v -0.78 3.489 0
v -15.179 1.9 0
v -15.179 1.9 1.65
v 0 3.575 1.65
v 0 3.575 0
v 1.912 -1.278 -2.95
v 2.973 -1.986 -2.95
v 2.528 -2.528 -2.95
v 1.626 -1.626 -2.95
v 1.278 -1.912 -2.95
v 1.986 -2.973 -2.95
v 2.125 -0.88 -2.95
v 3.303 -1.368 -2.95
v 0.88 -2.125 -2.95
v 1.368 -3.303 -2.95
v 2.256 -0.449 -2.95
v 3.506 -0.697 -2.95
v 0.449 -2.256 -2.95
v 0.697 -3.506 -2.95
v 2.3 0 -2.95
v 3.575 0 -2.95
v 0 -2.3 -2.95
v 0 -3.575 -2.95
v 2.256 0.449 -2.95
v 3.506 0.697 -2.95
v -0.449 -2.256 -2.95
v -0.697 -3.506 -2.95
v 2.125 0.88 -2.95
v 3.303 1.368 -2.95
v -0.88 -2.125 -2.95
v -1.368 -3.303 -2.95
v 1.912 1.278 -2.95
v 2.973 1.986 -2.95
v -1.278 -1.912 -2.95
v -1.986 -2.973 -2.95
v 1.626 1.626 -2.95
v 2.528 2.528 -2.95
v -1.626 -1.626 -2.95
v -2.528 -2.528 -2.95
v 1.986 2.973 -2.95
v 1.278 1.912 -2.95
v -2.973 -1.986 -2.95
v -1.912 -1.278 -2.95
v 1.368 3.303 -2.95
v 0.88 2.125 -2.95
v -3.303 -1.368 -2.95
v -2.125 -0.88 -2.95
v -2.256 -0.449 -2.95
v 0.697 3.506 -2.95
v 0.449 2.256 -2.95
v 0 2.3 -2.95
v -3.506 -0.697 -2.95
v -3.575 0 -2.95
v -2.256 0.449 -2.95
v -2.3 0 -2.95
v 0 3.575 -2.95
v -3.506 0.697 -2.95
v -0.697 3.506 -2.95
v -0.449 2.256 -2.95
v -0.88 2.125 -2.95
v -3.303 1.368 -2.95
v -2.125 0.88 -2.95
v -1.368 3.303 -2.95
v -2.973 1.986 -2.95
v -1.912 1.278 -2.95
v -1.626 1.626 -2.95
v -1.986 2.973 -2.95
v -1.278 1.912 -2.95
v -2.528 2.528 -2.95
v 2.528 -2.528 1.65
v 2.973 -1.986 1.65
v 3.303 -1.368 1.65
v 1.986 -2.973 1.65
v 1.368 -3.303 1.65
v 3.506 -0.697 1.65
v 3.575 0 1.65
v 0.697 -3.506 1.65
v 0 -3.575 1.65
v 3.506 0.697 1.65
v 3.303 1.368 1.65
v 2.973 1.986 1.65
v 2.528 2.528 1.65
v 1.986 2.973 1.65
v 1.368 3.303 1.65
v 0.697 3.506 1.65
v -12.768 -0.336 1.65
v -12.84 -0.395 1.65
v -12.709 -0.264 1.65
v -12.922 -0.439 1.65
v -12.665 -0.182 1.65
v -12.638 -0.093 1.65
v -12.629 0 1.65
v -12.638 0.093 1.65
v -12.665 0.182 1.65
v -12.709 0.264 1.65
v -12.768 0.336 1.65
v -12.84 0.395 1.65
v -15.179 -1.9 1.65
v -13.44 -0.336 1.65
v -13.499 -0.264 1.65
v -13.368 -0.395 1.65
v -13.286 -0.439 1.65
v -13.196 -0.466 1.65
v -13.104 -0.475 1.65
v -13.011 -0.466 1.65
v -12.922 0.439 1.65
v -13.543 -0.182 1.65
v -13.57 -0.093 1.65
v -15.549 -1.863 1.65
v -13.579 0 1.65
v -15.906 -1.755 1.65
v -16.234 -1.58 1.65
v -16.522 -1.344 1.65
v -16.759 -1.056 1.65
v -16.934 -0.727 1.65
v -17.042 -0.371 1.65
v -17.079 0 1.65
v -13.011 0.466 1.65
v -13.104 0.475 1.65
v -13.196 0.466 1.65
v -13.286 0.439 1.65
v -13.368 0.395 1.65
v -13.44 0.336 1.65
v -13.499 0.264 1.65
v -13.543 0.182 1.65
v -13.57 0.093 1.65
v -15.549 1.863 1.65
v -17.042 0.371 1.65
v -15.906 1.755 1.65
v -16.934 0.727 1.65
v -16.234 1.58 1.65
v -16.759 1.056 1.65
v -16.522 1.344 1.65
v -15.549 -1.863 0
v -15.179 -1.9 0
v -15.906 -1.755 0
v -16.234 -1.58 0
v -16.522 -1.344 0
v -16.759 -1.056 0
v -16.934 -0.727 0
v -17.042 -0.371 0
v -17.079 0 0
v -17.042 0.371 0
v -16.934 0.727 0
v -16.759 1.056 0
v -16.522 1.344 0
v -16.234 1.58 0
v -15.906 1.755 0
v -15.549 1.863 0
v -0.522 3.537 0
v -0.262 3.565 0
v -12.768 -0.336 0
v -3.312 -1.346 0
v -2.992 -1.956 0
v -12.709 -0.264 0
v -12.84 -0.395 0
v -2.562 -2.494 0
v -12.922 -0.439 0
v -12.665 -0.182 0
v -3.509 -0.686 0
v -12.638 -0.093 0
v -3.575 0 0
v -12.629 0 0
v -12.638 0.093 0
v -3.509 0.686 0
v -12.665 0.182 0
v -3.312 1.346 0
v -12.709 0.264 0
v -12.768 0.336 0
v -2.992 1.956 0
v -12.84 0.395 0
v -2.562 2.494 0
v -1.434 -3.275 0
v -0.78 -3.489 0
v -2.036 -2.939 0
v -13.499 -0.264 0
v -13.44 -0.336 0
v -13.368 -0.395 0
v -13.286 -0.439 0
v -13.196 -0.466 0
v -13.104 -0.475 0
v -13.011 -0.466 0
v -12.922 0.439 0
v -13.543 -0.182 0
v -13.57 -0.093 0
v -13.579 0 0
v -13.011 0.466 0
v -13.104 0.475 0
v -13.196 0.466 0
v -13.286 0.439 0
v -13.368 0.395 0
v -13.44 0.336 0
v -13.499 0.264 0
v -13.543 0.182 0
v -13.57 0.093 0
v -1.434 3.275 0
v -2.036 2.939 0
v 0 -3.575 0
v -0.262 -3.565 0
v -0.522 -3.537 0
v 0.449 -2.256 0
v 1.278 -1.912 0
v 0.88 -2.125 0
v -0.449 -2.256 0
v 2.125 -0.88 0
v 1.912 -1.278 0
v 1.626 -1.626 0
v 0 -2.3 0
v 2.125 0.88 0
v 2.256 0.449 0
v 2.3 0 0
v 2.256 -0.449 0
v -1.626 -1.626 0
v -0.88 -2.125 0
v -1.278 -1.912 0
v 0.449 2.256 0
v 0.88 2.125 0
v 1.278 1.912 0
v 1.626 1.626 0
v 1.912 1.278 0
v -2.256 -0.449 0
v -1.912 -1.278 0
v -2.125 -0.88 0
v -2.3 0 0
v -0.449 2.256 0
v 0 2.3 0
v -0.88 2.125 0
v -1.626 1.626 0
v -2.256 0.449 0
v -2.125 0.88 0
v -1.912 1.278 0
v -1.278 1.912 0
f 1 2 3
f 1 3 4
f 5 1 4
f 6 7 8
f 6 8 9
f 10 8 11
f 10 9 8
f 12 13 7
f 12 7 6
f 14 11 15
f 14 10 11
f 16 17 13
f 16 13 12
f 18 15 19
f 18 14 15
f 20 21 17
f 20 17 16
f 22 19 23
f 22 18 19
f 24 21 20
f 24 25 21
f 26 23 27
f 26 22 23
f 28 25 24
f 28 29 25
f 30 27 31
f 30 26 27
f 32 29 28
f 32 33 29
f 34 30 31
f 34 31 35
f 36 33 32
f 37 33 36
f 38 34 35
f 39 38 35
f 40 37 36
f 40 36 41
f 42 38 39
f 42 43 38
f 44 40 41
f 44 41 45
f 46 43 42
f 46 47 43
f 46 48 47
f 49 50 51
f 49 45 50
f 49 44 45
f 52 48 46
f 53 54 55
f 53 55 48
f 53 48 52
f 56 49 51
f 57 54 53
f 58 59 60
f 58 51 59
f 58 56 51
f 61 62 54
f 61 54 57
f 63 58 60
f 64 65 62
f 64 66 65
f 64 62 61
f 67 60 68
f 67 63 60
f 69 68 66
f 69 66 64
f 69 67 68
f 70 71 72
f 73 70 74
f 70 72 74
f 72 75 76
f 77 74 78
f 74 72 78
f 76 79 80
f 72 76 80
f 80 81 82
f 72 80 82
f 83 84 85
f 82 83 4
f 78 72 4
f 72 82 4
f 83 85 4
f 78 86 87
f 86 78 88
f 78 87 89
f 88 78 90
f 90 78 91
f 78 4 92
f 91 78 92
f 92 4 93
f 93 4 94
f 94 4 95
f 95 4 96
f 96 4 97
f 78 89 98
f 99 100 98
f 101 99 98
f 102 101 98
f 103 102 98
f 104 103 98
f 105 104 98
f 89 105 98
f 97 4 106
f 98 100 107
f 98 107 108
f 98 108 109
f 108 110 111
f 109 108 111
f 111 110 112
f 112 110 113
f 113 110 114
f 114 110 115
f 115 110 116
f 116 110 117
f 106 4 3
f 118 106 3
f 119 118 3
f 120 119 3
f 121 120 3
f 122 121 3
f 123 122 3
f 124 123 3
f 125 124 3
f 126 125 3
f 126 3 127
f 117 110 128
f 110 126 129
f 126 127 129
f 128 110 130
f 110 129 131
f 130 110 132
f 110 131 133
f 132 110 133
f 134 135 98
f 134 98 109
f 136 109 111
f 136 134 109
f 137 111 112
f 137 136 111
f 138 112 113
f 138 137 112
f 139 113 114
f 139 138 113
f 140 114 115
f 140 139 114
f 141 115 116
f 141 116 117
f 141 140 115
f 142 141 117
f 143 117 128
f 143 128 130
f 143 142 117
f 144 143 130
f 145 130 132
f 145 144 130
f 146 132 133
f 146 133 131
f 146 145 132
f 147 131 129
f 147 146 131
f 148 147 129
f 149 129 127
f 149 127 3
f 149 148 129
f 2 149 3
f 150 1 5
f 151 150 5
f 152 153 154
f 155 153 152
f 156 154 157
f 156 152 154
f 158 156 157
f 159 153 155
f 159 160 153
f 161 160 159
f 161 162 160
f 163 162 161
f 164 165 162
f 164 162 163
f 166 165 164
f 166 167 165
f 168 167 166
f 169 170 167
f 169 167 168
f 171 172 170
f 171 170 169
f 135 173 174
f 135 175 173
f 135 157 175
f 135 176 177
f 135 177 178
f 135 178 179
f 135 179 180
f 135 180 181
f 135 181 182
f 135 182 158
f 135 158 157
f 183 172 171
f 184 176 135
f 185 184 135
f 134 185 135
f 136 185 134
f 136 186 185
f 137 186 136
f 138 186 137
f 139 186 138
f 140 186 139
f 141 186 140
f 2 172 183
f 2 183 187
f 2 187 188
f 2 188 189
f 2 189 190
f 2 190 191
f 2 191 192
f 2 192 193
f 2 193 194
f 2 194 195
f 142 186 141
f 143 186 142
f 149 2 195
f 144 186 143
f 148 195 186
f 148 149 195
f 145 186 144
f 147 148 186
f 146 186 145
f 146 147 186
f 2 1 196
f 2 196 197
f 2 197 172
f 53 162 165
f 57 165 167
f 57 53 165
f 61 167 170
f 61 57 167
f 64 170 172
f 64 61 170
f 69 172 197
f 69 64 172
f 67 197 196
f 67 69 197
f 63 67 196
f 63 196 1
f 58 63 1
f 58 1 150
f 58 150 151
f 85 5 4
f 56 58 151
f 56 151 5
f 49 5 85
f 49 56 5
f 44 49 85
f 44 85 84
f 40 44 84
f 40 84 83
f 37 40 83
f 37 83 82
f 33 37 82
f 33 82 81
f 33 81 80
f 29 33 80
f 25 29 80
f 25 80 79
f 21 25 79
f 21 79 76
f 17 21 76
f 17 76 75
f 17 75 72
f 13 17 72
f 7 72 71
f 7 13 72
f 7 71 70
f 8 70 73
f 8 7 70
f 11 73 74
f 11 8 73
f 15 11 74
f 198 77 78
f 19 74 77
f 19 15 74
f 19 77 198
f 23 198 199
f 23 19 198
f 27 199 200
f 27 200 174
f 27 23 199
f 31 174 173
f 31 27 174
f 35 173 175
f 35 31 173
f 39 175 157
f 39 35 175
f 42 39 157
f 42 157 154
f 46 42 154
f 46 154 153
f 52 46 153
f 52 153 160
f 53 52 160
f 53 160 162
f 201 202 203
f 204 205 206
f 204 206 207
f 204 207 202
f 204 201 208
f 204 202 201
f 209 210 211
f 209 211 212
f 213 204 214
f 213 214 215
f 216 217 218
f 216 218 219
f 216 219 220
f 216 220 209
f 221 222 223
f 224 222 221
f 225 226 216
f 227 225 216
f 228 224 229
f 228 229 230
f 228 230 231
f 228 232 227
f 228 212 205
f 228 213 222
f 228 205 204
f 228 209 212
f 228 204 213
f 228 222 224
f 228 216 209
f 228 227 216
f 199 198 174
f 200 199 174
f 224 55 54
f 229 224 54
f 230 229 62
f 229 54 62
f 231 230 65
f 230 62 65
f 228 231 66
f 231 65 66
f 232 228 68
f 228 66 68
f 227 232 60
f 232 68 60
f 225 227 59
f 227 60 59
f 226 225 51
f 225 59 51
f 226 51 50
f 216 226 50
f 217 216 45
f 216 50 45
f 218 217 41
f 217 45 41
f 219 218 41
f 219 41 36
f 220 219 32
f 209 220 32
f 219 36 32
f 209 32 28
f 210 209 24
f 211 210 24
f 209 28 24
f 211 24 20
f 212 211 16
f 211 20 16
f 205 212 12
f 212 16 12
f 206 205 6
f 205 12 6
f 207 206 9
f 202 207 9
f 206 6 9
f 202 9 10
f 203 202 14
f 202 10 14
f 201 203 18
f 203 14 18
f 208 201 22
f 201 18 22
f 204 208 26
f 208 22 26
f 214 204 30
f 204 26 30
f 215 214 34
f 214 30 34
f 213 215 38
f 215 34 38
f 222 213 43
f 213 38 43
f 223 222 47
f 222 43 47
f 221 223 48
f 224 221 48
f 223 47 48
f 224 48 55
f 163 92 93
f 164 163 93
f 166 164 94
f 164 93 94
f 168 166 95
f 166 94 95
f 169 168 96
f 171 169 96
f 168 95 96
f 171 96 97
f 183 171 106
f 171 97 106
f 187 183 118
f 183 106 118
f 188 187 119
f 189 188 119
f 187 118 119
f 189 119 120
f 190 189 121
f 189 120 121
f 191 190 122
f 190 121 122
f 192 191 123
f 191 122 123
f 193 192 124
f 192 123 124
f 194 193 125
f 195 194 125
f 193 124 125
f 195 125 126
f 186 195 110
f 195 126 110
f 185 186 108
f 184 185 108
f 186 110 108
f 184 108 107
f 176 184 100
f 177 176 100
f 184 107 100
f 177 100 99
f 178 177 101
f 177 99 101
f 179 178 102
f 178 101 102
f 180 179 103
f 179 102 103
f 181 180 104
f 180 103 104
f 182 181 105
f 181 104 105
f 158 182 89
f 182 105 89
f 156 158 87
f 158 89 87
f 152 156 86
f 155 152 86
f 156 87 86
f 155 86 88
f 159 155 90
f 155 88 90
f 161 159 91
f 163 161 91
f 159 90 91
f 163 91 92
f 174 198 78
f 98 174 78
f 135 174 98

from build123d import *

# Parameters (mm, degrees)
BOSS_EXTRUDE1_DEPTH = 1.65
BOSS_EXTRUDE2_START = 2.95
SKETCH2_R           = 3.575
BOSS_EXTRUDE2_DEPTH = 2.95
SKETCH3_R           = 2.3
CUT_EXTRUDE1_DEPTH  = 2.95
SKETCH4_R           = 0.475
CUT_EXTRUDE2_DEPTH  = 1.65


with BuildPart() as part:
    # Sketch1 → Boss-Extrude1 (new body)
    with BuildSketch(Plane.XY):
        with BuildLine():
            Line((-15.178752219, 1.9), (0, 3.575))
            ThreePointArc((0, 3.575), (3.575, 0), (0, -3.575))
            Line((0, -3.575), (-15.178752219, -1.9))
            ThreePointArc((-15.178752219, -1.9), (-17.078752219, 0), (-15.178752219, 1.9))
        make_face()
    extrude(amount=BOSS_EXTRUDE1_DEPTH)

    # Sketch2 → Boss-Extrude2 (add)
    with BuildSketch(Plane(origin=(0, 0, 0), x_dir=(-1, 0, 0), z_dir=(0, 0, -1)).offset(BOSS_EXTRUDE2_START)):
        Circle(SKETCH2_R)
    extrude(amount=-BOSS_EXTRUDE2_DEPTH)

    # Sketch3 → Cut-Extrude1 (cut)
    with BuildSketch(Plane(origin=(0, 0, -2.95), x_dir=(-1, 0, 0), z_dir=(0, 0, -1))):
        Circle(SKETCH3_R)
    extrude(amount=-CUT_EXTRUDE1_DEPTH, mode=Mode.SUBTRACT)

    # Sketch4 → Cut-Extrude2 (cut)
    with BuildSketch(Plane.XY.offset(1.65)):
        with Locations((-13.103752219, 0)):
            Circle(SKETCH4_R)
    extrude(amount=-CUT_EXTRUDE2_DEPTH, mode=Mode.SUBTRACT)


solid = part.part
